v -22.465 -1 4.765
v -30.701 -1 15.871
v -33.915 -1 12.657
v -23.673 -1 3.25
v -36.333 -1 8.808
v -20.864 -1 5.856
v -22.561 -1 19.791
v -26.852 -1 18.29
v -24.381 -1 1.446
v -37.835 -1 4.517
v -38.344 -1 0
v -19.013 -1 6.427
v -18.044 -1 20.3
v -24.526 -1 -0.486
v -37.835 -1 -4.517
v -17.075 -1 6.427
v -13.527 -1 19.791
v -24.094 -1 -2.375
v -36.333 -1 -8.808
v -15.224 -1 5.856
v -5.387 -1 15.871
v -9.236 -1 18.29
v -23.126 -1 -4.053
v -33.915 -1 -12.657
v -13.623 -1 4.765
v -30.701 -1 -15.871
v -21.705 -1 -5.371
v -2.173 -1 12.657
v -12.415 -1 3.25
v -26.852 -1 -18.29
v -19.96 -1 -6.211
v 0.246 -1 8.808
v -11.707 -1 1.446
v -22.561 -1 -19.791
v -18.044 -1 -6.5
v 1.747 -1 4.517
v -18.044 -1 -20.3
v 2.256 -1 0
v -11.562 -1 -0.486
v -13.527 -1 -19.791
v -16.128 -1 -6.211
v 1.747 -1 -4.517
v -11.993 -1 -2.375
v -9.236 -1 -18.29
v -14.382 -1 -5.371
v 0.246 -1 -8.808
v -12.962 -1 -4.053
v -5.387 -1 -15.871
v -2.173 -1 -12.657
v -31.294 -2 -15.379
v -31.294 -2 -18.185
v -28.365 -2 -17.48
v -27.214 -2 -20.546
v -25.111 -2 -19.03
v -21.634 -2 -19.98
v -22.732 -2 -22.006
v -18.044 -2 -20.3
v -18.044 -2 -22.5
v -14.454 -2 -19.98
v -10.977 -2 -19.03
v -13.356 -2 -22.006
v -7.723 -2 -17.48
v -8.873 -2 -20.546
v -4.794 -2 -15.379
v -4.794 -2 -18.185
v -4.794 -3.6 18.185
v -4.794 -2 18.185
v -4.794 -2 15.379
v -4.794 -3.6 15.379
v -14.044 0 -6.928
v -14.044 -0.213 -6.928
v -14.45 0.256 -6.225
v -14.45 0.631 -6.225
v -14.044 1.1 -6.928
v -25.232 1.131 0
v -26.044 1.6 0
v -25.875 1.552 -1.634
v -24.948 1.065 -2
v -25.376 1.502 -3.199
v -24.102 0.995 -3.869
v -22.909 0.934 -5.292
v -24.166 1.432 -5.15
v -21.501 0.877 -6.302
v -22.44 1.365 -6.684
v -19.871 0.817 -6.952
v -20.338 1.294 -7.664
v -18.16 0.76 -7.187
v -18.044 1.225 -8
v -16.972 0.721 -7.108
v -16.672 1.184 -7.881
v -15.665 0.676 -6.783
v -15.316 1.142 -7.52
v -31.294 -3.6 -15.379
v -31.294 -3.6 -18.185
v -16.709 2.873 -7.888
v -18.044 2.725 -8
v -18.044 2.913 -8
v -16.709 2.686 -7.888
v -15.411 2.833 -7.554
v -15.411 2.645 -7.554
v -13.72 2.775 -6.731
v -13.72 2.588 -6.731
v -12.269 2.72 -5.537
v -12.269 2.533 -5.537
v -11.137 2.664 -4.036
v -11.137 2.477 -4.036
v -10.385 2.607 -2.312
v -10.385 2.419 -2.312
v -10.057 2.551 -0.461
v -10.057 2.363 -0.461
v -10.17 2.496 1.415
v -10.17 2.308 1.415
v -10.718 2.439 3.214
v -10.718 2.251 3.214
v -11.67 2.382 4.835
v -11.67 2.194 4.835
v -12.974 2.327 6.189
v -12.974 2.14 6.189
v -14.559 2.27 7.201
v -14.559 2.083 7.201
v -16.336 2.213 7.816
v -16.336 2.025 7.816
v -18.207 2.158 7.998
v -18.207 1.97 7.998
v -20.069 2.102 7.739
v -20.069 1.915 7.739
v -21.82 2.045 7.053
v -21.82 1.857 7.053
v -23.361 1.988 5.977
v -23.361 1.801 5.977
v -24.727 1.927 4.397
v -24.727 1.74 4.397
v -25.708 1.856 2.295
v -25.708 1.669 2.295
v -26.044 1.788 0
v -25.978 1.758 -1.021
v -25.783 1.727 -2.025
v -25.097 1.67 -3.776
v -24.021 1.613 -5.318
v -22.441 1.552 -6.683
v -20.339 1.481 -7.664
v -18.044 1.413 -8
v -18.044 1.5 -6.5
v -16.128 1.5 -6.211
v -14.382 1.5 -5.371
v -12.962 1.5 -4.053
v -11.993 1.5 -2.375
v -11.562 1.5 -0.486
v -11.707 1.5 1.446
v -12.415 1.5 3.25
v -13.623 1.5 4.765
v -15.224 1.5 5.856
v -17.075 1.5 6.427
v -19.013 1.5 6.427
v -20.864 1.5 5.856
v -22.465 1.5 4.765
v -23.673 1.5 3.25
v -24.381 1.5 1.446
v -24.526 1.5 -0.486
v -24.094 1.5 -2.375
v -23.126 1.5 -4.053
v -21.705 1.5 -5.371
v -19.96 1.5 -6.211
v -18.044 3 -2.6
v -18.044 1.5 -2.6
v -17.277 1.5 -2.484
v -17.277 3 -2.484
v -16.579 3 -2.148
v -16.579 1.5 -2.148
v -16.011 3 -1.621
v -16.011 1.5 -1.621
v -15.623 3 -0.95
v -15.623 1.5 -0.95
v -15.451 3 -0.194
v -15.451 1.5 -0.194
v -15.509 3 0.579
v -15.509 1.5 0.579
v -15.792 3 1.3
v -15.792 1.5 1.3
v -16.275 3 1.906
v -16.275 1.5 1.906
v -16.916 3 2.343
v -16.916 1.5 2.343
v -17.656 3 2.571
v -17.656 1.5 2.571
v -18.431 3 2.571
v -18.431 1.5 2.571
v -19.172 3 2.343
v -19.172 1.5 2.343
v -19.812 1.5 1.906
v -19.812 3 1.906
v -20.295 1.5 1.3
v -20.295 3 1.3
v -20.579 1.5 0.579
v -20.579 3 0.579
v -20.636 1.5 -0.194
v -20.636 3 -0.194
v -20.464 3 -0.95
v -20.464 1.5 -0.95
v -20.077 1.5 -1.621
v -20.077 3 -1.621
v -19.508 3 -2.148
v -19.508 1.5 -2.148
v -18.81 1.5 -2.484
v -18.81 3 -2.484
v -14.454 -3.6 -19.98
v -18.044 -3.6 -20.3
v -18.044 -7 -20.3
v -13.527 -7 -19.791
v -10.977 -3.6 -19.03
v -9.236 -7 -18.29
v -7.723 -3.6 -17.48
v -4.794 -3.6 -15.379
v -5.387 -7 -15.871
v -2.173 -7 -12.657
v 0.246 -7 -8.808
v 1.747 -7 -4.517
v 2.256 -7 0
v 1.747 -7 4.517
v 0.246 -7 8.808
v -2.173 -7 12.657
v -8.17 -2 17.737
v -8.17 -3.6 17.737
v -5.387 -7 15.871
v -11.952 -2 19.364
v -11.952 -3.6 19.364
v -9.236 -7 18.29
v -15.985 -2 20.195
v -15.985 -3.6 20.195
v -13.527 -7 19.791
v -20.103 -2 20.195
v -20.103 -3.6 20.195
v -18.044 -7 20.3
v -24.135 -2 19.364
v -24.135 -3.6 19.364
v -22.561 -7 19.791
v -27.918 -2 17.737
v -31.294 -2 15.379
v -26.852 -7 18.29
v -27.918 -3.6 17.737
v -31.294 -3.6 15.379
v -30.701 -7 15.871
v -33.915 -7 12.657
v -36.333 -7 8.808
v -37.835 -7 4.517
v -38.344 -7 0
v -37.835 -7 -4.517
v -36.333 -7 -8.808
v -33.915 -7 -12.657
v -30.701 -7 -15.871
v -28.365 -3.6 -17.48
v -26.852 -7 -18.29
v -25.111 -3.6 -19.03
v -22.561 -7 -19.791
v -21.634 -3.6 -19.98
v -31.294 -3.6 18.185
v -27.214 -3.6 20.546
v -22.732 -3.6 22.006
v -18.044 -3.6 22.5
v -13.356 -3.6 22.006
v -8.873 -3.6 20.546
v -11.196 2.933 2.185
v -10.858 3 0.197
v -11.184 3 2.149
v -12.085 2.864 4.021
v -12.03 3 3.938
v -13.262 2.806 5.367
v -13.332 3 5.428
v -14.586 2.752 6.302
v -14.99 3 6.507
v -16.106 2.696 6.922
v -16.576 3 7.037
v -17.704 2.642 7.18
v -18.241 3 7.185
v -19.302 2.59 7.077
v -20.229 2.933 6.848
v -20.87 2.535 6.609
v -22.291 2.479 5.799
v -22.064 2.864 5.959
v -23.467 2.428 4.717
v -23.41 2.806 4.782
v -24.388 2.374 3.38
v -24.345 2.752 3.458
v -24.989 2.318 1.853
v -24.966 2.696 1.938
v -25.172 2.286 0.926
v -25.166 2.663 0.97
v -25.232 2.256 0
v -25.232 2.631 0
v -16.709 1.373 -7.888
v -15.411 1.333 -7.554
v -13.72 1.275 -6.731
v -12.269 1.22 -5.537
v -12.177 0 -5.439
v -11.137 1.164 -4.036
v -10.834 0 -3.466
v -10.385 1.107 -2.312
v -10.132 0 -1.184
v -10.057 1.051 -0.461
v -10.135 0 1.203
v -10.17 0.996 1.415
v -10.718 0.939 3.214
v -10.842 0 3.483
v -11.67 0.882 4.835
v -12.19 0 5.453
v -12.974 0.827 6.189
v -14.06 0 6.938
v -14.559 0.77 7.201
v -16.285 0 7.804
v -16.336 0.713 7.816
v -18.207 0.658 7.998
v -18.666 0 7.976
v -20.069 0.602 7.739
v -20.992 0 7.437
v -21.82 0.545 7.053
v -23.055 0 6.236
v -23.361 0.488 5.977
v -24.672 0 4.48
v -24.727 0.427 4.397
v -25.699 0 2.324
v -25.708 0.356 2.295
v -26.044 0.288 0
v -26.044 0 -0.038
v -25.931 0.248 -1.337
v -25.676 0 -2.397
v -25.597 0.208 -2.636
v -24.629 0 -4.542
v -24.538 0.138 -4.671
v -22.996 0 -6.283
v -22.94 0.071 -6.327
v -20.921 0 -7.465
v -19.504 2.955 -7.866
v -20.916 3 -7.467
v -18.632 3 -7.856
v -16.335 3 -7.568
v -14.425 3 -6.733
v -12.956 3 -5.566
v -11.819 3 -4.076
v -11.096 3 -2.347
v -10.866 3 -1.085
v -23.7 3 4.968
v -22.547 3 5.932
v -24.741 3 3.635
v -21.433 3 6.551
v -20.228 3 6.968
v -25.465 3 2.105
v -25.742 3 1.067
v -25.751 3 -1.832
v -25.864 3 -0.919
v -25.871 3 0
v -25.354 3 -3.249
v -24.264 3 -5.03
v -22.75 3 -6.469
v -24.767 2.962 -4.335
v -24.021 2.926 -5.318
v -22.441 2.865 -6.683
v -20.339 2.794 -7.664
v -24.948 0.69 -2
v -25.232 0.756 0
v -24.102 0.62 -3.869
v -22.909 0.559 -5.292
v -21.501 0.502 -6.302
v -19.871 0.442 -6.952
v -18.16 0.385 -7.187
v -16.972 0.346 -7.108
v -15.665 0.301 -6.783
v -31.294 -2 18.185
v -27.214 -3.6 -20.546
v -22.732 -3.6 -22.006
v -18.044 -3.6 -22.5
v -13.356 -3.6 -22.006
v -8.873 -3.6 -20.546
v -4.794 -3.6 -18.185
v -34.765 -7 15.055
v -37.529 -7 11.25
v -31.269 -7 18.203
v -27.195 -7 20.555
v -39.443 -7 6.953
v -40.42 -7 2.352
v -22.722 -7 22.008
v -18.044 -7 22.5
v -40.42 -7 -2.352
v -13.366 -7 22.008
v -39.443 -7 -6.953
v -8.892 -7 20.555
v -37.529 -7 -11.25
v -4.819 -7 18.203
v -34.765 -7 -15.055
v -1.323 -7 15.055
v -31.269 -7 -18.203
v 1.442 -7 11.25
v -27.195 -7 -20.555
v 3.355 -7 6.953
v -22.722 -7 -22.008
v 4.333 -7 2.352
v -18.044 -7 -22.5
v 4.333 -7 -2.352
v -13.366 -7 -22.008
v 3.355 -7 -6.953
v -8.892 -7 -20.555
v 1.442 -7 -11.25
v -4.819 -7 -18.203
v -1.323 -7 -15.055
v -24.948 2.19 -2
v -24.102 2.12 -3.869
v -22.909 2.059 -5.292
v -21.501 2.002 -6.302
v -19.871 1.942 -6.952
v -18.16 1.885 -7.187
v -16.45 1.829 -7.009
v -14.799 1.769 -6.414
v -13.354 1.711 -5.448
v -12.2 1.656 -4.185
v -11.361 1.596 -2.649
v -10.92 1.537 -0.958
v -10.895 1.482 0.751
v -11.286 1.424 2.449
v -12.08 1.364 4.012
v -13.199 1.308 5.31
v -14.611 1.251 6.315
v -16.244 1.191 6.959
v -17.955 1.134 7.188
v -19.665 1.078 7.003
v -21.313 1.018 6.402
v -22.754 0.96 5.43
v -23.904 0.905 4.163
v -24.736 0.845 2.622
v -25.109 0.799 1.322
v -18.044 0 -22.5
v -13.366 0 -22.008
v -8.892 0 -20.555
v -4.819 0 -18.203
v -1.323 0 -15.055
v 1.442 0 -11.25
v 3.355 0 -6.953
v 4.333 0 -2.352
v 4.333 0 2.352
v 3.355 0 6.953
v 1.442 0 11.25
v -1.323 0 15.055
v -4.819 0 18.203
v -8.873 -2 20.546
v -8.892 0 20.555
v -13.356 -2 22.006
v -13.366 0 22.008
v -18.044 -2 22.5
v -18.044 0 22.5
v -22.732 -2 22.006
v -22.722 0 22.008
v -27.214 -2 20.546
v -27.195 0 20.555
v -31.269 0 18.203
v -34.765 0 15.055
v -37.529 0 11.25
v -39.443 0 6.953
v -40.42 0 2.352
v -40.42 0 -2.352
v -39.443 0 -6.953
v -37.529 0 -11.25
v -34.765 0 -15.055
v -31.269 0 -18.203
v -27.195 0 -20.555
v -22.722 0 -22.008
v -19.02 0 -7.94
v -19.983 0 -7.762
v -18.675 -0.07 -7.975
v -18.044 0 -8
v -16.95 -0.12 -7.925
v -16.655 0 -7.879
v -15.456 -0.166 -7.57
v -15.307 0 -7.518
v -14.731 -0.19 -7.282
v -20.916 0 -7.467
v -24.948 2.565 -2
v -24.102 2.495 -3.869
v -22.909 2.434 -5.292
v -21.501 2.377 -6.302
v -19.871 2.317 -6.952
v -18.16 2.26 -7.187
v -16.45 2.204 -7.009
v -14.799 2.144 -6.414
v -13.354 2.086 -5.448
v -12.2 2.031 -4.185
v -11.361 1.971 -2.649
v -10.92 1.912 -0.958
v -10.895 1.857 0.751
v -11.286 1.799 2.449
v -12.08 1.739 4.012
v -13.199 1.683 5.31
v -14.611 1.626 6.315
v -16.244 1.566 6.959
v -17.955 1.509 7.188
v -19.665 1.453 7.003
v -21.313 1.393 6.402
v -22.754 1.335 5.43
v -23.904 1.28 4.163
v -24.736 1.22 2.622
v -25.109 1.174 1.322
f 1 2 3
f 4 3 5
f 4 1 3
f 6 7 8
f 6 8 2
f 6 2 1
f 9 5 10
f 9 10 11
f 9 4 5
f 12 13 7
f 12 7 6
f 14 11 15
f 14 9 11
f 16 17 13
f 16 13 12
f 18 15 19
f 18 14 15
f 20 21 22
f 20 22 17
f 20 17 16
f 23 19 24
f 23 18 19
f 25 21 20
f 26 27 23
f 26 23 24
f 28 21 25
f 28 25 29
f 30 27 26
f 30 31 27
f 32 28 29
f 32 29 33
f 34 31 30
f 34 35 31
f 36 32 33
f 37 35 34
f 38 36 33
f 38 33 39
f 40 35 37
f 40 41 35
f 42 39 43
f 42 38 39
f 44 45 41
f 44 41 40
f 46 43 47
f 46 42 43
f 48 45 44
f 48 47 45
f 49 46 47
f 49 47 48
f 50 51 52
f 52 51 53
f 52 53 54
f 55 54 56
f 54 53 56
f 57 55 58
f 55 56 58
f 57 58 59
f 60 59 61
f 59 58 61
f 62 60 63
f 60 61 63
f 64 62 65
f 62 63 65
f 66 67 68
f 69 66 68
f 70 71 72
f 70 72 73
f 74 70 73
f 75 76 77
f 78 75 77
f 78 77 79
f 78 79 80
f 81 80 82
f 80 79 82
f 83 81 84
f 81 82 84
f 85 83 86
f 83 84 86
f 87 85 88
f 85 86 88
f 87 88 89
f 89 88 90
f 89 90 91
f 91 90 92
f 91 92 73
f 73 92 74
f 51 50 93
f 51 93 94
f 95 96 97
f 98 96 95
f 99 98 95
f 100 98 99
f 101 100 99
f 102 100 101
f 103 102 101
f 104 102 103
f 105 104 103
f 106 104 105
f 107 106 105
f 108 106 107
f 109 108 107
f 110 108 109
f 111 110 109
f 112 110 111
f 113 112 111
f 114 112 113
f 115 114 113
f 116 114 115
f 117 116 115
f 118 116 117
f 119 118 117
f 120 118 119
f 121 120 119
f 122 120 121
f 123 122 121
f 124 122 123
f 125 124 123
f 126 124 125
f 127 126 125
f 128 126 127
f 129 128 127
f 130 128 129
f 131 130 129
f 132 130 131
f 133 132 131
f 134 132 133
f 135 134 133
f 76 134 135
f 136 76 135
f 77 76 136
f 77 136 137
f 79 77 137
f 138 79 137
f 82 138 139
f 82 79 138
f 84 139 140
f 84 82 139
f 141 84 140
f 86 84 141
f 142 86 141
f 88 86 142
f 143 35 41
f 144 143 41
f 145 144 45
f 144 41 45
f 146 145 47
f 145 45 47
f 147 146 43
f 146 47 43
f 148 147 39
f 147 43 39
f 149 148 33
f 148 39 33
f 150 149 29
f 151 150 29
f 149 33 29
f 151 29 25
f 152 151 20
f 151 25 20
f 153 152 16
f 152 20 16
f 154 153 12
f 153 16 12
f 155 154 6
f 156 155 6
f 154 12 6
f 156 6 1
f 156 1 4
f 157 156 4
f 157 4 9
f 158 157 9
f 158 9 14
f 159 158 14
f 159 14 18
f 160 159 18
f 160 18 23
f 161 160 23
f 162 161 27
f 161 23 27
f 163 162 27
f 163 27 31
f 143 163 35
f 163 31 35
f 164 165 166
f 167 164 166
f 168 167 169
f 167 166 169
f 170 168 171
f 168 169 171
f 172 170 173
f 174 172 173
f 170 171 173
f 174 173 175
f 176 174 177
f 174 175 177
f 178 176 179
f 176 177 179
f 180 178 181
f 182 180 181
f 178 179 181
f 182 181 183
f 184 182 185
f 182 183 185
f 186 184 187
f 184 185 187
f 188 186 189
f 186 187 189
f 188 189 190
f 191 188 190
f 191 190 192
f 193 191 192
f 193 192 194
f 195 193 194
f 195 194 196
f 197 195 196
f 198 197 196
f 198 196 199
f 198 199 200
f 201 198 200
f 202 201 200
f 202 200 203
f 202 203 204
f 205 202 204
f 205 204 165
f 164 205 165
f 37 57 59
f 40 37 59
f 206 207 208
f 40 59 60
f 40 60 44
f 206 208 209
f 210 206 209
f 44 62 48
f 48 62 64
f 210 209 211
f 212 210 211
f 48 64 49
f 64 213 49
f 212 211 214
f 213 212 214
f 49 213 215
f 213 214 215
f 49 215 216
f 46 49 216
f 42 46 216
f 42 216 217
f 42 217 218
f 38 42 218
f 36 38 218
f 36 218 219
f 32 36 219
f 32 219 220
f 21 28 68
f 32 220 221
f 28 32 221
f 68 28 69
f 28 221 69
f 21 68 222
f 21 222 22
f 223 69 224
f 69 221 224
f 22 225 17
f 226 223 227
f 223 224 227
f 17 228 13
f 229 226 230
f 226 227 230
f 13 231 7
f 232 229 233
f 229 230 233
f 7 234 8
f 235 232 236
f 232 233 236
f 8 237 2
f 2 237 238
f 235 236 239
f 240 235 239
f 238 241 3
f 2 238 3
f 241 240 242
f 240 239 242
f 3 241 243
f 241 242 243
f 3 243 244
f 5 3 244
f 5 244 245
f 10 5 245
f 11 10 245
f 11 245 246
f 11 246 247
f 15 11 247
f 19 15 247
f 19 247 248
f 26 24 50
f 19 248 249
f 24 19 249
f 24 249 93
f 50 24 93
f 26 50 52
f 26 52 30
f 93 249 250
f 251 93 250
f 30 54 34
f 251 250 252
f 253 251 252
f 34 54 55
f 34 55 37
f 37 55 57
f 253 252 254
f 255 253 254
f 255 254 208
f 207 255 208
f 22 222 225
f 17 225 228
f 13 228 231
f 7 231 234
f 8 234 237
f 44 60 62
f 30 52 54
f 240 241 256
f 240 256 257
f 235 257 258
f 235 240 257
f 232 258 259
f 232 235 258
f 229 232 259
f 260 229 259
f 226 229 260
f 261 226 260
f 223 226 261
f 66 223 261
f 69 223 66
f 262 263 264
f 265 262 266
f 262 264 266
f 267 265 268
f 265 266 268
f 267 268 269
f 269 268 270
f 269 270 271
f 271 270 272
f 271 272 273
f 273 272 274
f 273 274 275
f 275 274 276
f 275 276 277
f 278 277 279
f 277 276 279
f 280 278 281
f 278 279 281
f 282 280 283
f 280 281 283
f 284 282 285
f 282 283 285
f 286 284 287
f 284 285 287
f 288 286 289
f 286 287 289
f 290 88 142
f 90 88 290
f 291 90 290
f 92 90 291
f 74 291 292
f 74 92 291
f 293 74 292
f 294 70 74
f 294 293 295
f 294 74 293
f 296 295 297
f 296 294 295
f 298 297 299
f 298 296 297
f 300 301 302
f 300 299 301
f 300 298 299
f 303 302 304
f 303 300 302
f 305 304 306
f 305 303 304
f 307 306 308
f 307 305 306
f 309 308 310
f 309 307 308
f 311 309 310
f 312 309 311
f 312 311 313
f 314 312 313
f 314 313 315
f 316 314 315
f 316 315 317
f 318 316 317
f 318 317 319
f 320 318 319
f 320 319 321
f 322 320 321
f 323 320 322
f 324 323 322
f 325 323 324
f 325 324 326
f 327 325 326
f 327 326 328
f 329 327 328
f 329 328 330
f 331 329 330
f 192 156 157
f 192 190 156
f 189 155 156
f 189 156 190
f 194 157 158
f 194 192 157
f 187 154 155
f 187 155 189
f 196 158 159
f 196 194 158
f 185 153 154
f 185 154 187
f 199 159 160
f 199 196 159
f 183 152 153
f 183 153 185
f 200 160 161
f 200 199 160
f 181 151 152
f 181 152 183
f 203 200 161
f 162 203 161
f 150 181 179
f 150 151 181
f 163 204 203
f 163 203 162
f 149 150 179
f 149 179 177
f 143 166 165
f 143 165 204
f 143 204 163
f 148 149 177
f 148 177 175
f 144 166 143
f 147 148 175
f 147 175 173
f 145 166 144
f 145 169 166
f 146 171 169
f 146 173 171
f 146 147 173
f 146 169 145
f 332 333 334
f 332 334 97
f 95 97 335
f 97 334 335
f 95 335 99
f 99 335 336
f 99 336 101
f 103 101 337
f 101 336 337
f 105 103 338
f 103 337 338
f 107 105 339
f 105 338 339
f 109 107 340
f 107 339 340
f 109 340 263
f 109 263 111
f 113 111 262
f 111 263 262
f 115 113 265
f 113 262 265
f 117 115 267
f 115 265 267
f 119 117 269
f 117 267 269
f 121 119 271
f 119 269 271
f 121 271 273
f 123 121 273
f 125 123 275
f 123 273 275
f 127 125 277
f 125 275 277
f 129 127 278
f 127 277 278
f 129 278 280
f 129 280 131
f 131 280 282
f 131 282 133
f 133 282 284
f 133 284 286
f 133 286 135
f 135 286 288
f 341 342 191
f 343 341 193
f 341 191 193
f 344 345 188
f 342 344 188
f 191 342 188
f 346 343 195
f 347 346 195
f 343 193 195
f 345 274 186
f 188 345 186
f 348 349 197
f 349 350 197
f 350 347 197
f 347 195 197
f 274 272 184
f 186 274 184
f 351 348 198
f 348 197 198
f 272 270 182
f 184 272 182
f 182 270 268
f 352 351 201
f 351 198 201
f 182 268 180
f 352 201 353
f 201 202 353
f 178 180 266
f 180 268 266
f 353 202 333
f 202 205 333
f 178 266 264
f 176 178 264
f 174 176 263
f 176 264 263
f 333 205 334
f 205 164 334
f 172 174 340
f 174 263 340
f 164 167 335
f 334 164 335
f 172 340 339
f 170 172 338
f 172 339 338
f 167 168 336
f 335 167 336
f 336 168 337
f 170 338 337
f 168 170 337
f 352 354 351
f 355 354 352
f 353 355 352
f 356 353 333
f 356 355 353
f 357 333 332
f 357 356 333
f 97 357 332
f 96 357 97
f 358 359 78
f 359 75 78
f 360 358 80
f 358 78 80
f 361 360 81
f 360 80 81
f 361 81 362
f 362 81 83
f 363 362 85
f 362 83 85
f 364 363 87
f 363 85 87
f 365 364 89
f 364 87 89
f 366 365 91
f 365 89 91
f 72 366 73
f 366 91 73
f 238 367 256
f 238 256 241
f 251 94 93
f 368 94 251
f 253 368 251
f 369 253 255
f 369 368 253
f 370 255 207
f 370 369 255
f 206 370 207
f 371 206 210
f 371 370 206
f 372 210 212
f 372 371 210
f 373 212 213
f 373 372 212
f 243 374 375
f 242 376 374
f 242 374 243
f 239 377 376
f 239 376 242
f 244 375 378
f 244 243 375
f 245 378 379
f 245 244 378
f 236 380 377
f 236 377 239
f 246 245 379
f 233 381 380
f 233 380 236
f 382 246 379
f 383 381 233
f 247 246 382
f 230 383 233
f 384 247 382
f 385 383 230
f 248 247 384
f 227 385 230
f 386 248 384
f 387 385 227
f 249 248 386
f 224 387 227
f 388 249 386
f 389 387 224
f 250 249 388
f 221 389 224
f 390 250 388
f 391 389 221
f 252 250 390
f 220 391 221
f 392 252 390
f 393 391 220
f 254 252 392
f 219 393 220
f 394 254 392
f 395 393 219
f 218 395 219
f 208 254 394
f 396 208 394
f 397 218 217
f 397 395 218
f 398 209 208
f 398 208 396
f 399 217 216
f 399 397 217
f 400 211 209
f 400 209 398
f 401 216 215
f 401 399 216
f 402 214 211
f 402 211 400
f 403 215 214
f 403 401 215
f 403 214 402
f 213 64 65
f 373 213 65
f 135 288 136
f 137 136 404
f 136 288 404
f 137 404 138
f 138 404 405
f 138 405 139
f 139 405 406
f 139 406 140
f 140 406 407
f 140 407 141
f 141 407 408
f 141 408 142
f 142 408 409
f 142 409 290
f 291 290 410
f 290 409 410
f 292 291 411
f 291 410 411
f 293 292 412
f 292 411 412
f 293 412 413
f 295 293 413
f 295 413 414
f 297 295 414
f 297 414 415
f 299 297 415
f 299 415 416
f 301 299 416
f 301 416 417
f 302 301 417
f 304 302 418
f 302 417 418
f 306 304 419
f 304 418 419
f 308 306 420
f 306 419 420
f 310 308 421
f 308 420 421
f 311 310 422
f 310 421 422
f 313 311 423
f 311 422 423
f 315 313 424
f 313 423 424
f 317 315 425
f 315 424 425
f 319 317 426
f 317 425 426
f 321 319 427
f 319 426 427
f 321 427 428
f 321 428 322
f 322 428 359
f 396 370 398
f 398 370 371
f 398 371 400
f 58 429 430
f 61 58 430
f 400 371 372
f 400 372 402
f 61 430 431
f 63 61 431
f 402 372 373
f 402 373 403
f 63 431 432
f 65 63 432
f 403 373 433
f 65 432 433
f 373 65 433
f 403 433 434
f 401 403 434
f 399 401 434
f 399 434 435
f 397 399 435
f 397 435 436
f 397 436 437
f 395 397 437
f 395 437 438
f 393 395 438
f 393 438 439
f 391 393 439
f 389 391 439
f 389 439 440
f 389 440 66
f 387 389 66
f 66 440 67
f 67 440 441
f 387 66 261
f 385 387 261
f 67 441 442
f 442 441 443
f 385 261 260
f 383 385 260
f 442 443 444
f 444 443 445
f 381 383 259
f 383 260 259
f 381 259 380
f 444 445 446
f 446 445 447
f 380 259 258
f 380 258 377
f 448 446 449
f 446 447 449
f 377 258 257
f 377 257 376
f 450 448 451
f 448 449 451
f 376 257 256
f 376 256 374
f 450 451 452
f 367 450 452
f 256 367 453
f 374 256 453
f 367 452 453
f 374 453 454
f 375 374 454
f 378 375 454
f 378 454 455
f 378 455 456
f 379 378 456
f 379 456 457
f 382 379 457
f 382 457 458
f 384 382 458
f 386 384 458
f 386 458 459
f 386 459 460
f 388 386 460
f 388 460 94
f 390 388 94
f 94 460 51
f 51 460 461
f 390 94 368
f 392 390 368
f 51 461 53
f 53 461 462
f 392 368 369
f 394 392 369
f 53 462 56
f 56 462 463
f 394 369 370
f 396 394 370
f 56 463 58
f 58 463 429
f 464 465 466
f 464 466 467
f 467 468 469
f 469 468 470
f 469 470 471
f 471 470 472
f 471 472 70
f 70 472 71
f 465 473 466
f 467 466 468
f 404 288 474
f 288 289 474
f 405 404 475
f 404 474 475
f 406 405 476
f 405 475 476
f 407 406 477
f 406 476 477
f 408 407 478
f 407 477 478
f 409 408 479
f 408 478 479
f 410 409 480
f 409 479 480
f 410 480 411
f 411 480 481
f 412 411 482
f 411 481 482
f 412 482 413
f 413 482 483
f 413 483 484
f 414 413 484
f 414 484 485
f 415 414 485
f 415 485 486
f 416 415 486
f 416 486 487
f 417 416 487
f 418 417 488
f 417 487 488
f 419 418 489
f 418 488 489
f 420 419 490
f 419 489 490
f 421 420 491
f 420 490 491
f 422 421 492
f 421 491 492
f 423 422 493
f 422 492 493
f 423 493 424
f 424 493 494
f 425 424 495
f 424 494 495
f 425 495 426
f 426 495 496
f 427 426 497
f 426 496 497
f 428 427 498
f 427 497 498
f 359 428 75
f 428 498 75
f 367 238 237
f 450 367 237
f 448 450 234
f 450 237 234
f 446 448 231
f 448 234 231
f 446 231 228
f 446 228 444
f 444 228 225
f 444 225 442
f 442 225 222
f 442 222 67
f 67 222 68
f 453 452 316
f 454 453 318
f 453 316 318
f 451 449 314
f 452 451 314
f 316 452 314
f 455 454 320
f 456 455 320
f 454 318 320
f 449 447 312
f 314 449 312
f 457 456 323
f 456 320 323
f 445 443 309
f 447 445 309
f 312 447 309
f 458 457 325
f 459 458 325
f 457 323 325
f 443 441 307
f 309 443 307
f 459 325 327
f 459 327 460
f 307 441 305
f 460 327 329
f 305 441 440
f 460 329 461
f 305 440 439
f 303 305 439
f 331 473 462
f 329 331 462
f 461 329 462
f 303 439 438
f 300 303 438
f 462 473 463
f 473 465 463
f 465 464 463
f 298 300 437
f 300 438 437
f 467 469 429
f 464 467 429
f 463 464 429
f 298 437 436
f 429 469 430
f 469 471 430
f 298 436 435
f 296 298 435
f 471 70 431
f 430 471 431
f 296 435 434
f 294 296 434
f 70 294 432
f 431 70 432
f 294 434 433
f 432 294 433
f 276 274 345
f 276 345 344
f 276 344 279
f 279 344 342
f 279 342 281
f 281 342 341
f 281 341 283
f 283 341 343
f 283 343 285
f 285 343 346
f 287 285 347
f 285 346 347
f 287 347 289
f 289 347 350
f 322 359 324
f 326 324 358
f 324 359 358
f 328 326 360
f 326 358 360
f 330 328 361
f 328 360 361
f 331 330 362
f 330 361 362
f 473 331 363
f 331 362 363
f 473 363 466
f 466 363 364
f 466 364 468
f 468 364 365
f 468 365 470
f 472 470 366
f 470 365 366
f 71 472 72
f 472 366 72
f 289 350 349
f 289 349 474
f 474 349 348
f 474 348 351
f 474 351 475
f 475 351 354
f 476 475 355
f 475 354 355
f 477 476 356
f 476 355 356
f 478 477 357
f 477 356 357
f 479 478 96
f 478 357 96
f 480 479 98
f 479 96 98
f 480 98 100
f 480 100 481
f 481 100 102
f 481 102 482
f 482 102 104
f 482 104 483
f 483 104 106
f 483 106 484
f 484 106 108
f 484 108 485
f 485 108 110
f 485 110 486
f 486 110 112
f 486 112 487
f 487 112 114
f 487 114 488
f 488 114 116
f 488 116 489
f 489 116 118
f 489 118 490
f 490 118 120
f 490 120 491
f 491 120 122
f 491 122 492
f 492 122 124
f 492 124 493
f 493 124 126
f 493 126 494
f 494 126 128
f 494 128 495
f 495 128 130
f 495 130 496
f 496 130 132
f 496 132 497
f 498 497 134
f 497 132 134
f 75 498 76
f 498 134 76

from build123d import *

# Parameters (mm, degrees)
SKIZZE1_R                            = 5
ZYLINDER_DEPTH                       = 2.2
SCHNITT_LINEAR_AUSTRAGEN1_DEPTH      = 10
SCHNITT_LINEAR_AUSTRAGEN1_DEPTH_BACK = 5
SKIZZE4_R                            = 4.5
SKIZZE6_R                            = 22.5
FASSUNG_OBJEKTTR_GERGEWINDE_DEPTH    = 7
SKIZZE11_R                           = 20.3
BOHRUNG_F_R_INNENGEWINDE_DEPTH       = 6
SKIZZE13_R                           = 8
ZYLINDER_F_R_GEWINDE_DEPTH           = 3
SKIZZE16_R                           = 2.6
LINSENEINSATZ_DEPTH                  = 10
GEWINDE1_PITCH                       = 1.5
SKIZZE17_W                           = 26.5
SKIZZE17_H                           = 49.541135346
SCHLITZ_F_R_SLIDE_DEPTH              = 1.6
SKIZZE21_R                           = 6.5
FILTEREINSATZ_DEPTH                  = 2.5


with BuildPart() as part:
    # Skizze1 → Zylinder (new body)
    with BuildSketch(Plane(origin=(0, 0, 0), x_dir=(1, 0, 0), z_dir=(0, 1, 0))):
        with Locations(Location((-18.043745097, 0, 0), (0, 0, 270))):
            Circle(SKIZZE1_R)
    extrude(amount=ZYLINDER_DEPTH)

    # Skizze4 → Schnitt-Linear austragen1 (cut, two sides: drawn at the far end of the back side and taken through both)
    with BuildSketch(Plane(origin=(0, 2.2, 0), x_dir=(1, 0, 0), z_dir=(0, 1, 0)).offset(-SCHNITT_LINEAR_AUSTRAGEN1_DEPTH_BACK)):
        with Locations(Location((-18.043745097, 0, 0), (0, 0, 270))):
            Circle(SKIZZE4_R)
    extrude(amount=SCHNITT_LINEAR_AUSTRAGEN1_DEPTH + SCHNITT_LINEAR_AUSTRAGEN1_DEPTH_BACK, mode=Mode.SUBTRACT)

    # Skizze6 → Fassung Objektträgergewinde (add)
    with BuildSketch(Plane(origin=(0, 0, 0), x_dir=(-1, 0, 0), z_dir=(0, -1, 0))):
        with Locations(Location((18.043745097, 0, 0), (0, 0, 90))):
            Circle(SKIZZE6_R)
    extrude(amount=FASSUNG_OBJEKTTR_GERGEWINDE_DEPTH)

    # Skizze11 → Bohrung für Innengewinde (cut)
    with BuildSketch(Plane(origin=(0, -7, 0), x_dir=(-1, 0, 0), z_dir=(0, -1, 0))):
        with Locations(Location((18.043745097, 0, 0), (0, 0, 90))):
            Circle(SKIZZE11_R)
    extrude(amount=-BOHRUNG_F_R_INNENGEWINDE_DEPTH, mode=Mode.SUBTRACT)

    # Skizze13 → Zylinder für Gewinde (add)
    with BuildSketch(Plane(origin=(0, 0, 0), x_dir=(-1, 0, 0), z_dir=(0, -1, 0))):
        with Locations(Location((18.043745097, 0, 0), (0, 0, 90))):
            Circle(SKIZZE13_R)
    extrude(amount=-ZYLINDER_F_R_GEWINDE_DEPTH)

    # Skizze16 → Linseneinsatz (cut)
    with BuildSketch(Plane(origin=(0, -7, 0), x_dir=(-1, 0, 0), z_dir=(0, -1, 0))):
        with Locations(Location((18.043745097, 0, 0), (0, 0, 90))):
            Circle(SKIZZE16_R)
    extrude(amount=-LINSENEINSATZ_DEPTH, mode=Mode.SUBTRACT)

    # Gewinde1: the profile of Gewindeprofil1 profile screwed along a right-hand helix of 2.333333 turns, 8 arcs to a turn; built about Z, then put on its axis
    gewinde1_z = Axis((0, 0, 0), (0, 0, 1))
    gewinde1_corners = [(8.0003, 0, -0.000173205), (8.0003, 0, 1.312673201), (7.188101187, 0, 0.843749998), (7.188101187, 0, 0.468749998)]
    with BuildLine(mode=Mode.PRIVATE) as gewinde1_profile:
        Line(gewinde1_corners[0], gewinde1_corners[1])
        Line(gewinde1_corners[1], gewinde1_corners[2])
        Line(gewinde1_corners[2], gewinde1_corners[3])
        Line(gewinde1_corners[3], gewinde1_corners[0])
    gewinde1_cap = Face(gewinde1_profile.wire())
    gewinde1_turn_angles = [0, 22.5, 45, 67.5, 90, 112.5, 135, 157.5, 180, 202.5, 225, 247.5, 270, 292.5, 315, 337.5, 360]
    gewinde1_turn_weights = [1, 0.9238795325112867, 1, 0.9238795325112867, 1, 0.9238795325112867, 1, 0.9238795325112867, 1, 0.9238795325112867, 1, 0.9238795325112867, 1, 0.9238795325112867, 1, 0.9238795325112867, 1]
    gewinde1_turn_rails = [Edge.make_bspline([Vector(p[0], p[1], 0).rotate(gewinde1_z, gewinde1_turn_angles[k]) / gewinde1_turn_weights[k] + Vector(0, 0, p[2] + GEWINDE1_PITCH * gewinde1_turn_angles[k] / 360) for k in range(17)], [0, 0, 0, 1, 1, 2, 2, 3, 3, 4, 4, 5, 5, 6, 6, 7, 7, 8, 8, 8], 2, gewinde1_turn_weights) for p in gewinde1_corners]
    gewinde1_turn_sides = [Face.make_surface_from_curves(gewinde1_turn_rails[p[0]], gewinde1_turn_rails[p[1]]) for p in [(0, 1), (1, 2), (2, 3), (3, 0)]]
    gewinde1_last_angles = [720, 742.5, 765, 787.5, 810, 825, 840]
    gewinde1_last_weights = [1, 0.9238795325112867, 1, 0.9238795325112867, 1, 0.9659258262890685, 1]
    gewinde1_last_rails = [Edge.make_bspline([Vector(p[0], p[1], 0).rotate(gewinde1_z, gewinde1_last_angles[k]) / gewinde1_last_weights[k] + Vector(0, 0, p[2] + GEWINDE1_PITCH * gewinde1_last_angles[k] / 360) for k in range(7)], [0, 0, 0, 1, 1, 2, 2, 3, 3, 3], 2, gewinde1_last_weights) for p in gewinde1_corners]
    gewinde1_last_sides = [Face.make_surface_from_curves(gewinde1_last_rails[p[0]], gewinde1_last_rails[p[1]]) for p in [(0, 1), (1, 2), (2, 3), (3, 0)]]
    gewinde1 = Plane(origin=(-18.043745097, 4.6, 0), x_dir=(-1, 0, 0), z_dir=(0, -1, 0)) * Solid(Shell([*[p.moved(Location((0, 0, GEWINDE1_PITCH * i))) for i in range(2) for p in gewinde1_turn_sides], *gewinde1_last_sides, gewinde1_cap, gewinde1_cap.rotate(gewinde1_z, 840).moved(Location((0, 0, GEWINDE1_PITCH * 840 / 360)))]))
    add(gewinde1, mode=Mode.SUBTRACT)

    # Skizze17 → Schlitz für Slide (cut)
    with BuildSketch(Plane(origin=(0, -2, 0), x_dir=(1, 0, 0), z_dir=(0, 1, 0))):
        with Locations((-18.043745097, 0)):
            Rectangle(SKIZZE17_W, SKIZZE17_H)
    extrude(amount=-SCHLITZ_F_R_SLIDE_DEPTH, mode=Mode.SUBTRACT)

    # Skizze21 → Filtereinsatz (cut)
    with BuildSketch(Plane(origin=(0, -1, 0), x_dir=(-1, 0, 0), z_dir=(0, -1, 0))):
        with Locations(Location((18.043745097, 0, 0), (0, 0, 90))):
            Circle(SKIZZE21_R)
    extrude(amount=-FILTEREINSATZ_DEPTH, mode=Mode.SUBTRACT)


solid = part.part
